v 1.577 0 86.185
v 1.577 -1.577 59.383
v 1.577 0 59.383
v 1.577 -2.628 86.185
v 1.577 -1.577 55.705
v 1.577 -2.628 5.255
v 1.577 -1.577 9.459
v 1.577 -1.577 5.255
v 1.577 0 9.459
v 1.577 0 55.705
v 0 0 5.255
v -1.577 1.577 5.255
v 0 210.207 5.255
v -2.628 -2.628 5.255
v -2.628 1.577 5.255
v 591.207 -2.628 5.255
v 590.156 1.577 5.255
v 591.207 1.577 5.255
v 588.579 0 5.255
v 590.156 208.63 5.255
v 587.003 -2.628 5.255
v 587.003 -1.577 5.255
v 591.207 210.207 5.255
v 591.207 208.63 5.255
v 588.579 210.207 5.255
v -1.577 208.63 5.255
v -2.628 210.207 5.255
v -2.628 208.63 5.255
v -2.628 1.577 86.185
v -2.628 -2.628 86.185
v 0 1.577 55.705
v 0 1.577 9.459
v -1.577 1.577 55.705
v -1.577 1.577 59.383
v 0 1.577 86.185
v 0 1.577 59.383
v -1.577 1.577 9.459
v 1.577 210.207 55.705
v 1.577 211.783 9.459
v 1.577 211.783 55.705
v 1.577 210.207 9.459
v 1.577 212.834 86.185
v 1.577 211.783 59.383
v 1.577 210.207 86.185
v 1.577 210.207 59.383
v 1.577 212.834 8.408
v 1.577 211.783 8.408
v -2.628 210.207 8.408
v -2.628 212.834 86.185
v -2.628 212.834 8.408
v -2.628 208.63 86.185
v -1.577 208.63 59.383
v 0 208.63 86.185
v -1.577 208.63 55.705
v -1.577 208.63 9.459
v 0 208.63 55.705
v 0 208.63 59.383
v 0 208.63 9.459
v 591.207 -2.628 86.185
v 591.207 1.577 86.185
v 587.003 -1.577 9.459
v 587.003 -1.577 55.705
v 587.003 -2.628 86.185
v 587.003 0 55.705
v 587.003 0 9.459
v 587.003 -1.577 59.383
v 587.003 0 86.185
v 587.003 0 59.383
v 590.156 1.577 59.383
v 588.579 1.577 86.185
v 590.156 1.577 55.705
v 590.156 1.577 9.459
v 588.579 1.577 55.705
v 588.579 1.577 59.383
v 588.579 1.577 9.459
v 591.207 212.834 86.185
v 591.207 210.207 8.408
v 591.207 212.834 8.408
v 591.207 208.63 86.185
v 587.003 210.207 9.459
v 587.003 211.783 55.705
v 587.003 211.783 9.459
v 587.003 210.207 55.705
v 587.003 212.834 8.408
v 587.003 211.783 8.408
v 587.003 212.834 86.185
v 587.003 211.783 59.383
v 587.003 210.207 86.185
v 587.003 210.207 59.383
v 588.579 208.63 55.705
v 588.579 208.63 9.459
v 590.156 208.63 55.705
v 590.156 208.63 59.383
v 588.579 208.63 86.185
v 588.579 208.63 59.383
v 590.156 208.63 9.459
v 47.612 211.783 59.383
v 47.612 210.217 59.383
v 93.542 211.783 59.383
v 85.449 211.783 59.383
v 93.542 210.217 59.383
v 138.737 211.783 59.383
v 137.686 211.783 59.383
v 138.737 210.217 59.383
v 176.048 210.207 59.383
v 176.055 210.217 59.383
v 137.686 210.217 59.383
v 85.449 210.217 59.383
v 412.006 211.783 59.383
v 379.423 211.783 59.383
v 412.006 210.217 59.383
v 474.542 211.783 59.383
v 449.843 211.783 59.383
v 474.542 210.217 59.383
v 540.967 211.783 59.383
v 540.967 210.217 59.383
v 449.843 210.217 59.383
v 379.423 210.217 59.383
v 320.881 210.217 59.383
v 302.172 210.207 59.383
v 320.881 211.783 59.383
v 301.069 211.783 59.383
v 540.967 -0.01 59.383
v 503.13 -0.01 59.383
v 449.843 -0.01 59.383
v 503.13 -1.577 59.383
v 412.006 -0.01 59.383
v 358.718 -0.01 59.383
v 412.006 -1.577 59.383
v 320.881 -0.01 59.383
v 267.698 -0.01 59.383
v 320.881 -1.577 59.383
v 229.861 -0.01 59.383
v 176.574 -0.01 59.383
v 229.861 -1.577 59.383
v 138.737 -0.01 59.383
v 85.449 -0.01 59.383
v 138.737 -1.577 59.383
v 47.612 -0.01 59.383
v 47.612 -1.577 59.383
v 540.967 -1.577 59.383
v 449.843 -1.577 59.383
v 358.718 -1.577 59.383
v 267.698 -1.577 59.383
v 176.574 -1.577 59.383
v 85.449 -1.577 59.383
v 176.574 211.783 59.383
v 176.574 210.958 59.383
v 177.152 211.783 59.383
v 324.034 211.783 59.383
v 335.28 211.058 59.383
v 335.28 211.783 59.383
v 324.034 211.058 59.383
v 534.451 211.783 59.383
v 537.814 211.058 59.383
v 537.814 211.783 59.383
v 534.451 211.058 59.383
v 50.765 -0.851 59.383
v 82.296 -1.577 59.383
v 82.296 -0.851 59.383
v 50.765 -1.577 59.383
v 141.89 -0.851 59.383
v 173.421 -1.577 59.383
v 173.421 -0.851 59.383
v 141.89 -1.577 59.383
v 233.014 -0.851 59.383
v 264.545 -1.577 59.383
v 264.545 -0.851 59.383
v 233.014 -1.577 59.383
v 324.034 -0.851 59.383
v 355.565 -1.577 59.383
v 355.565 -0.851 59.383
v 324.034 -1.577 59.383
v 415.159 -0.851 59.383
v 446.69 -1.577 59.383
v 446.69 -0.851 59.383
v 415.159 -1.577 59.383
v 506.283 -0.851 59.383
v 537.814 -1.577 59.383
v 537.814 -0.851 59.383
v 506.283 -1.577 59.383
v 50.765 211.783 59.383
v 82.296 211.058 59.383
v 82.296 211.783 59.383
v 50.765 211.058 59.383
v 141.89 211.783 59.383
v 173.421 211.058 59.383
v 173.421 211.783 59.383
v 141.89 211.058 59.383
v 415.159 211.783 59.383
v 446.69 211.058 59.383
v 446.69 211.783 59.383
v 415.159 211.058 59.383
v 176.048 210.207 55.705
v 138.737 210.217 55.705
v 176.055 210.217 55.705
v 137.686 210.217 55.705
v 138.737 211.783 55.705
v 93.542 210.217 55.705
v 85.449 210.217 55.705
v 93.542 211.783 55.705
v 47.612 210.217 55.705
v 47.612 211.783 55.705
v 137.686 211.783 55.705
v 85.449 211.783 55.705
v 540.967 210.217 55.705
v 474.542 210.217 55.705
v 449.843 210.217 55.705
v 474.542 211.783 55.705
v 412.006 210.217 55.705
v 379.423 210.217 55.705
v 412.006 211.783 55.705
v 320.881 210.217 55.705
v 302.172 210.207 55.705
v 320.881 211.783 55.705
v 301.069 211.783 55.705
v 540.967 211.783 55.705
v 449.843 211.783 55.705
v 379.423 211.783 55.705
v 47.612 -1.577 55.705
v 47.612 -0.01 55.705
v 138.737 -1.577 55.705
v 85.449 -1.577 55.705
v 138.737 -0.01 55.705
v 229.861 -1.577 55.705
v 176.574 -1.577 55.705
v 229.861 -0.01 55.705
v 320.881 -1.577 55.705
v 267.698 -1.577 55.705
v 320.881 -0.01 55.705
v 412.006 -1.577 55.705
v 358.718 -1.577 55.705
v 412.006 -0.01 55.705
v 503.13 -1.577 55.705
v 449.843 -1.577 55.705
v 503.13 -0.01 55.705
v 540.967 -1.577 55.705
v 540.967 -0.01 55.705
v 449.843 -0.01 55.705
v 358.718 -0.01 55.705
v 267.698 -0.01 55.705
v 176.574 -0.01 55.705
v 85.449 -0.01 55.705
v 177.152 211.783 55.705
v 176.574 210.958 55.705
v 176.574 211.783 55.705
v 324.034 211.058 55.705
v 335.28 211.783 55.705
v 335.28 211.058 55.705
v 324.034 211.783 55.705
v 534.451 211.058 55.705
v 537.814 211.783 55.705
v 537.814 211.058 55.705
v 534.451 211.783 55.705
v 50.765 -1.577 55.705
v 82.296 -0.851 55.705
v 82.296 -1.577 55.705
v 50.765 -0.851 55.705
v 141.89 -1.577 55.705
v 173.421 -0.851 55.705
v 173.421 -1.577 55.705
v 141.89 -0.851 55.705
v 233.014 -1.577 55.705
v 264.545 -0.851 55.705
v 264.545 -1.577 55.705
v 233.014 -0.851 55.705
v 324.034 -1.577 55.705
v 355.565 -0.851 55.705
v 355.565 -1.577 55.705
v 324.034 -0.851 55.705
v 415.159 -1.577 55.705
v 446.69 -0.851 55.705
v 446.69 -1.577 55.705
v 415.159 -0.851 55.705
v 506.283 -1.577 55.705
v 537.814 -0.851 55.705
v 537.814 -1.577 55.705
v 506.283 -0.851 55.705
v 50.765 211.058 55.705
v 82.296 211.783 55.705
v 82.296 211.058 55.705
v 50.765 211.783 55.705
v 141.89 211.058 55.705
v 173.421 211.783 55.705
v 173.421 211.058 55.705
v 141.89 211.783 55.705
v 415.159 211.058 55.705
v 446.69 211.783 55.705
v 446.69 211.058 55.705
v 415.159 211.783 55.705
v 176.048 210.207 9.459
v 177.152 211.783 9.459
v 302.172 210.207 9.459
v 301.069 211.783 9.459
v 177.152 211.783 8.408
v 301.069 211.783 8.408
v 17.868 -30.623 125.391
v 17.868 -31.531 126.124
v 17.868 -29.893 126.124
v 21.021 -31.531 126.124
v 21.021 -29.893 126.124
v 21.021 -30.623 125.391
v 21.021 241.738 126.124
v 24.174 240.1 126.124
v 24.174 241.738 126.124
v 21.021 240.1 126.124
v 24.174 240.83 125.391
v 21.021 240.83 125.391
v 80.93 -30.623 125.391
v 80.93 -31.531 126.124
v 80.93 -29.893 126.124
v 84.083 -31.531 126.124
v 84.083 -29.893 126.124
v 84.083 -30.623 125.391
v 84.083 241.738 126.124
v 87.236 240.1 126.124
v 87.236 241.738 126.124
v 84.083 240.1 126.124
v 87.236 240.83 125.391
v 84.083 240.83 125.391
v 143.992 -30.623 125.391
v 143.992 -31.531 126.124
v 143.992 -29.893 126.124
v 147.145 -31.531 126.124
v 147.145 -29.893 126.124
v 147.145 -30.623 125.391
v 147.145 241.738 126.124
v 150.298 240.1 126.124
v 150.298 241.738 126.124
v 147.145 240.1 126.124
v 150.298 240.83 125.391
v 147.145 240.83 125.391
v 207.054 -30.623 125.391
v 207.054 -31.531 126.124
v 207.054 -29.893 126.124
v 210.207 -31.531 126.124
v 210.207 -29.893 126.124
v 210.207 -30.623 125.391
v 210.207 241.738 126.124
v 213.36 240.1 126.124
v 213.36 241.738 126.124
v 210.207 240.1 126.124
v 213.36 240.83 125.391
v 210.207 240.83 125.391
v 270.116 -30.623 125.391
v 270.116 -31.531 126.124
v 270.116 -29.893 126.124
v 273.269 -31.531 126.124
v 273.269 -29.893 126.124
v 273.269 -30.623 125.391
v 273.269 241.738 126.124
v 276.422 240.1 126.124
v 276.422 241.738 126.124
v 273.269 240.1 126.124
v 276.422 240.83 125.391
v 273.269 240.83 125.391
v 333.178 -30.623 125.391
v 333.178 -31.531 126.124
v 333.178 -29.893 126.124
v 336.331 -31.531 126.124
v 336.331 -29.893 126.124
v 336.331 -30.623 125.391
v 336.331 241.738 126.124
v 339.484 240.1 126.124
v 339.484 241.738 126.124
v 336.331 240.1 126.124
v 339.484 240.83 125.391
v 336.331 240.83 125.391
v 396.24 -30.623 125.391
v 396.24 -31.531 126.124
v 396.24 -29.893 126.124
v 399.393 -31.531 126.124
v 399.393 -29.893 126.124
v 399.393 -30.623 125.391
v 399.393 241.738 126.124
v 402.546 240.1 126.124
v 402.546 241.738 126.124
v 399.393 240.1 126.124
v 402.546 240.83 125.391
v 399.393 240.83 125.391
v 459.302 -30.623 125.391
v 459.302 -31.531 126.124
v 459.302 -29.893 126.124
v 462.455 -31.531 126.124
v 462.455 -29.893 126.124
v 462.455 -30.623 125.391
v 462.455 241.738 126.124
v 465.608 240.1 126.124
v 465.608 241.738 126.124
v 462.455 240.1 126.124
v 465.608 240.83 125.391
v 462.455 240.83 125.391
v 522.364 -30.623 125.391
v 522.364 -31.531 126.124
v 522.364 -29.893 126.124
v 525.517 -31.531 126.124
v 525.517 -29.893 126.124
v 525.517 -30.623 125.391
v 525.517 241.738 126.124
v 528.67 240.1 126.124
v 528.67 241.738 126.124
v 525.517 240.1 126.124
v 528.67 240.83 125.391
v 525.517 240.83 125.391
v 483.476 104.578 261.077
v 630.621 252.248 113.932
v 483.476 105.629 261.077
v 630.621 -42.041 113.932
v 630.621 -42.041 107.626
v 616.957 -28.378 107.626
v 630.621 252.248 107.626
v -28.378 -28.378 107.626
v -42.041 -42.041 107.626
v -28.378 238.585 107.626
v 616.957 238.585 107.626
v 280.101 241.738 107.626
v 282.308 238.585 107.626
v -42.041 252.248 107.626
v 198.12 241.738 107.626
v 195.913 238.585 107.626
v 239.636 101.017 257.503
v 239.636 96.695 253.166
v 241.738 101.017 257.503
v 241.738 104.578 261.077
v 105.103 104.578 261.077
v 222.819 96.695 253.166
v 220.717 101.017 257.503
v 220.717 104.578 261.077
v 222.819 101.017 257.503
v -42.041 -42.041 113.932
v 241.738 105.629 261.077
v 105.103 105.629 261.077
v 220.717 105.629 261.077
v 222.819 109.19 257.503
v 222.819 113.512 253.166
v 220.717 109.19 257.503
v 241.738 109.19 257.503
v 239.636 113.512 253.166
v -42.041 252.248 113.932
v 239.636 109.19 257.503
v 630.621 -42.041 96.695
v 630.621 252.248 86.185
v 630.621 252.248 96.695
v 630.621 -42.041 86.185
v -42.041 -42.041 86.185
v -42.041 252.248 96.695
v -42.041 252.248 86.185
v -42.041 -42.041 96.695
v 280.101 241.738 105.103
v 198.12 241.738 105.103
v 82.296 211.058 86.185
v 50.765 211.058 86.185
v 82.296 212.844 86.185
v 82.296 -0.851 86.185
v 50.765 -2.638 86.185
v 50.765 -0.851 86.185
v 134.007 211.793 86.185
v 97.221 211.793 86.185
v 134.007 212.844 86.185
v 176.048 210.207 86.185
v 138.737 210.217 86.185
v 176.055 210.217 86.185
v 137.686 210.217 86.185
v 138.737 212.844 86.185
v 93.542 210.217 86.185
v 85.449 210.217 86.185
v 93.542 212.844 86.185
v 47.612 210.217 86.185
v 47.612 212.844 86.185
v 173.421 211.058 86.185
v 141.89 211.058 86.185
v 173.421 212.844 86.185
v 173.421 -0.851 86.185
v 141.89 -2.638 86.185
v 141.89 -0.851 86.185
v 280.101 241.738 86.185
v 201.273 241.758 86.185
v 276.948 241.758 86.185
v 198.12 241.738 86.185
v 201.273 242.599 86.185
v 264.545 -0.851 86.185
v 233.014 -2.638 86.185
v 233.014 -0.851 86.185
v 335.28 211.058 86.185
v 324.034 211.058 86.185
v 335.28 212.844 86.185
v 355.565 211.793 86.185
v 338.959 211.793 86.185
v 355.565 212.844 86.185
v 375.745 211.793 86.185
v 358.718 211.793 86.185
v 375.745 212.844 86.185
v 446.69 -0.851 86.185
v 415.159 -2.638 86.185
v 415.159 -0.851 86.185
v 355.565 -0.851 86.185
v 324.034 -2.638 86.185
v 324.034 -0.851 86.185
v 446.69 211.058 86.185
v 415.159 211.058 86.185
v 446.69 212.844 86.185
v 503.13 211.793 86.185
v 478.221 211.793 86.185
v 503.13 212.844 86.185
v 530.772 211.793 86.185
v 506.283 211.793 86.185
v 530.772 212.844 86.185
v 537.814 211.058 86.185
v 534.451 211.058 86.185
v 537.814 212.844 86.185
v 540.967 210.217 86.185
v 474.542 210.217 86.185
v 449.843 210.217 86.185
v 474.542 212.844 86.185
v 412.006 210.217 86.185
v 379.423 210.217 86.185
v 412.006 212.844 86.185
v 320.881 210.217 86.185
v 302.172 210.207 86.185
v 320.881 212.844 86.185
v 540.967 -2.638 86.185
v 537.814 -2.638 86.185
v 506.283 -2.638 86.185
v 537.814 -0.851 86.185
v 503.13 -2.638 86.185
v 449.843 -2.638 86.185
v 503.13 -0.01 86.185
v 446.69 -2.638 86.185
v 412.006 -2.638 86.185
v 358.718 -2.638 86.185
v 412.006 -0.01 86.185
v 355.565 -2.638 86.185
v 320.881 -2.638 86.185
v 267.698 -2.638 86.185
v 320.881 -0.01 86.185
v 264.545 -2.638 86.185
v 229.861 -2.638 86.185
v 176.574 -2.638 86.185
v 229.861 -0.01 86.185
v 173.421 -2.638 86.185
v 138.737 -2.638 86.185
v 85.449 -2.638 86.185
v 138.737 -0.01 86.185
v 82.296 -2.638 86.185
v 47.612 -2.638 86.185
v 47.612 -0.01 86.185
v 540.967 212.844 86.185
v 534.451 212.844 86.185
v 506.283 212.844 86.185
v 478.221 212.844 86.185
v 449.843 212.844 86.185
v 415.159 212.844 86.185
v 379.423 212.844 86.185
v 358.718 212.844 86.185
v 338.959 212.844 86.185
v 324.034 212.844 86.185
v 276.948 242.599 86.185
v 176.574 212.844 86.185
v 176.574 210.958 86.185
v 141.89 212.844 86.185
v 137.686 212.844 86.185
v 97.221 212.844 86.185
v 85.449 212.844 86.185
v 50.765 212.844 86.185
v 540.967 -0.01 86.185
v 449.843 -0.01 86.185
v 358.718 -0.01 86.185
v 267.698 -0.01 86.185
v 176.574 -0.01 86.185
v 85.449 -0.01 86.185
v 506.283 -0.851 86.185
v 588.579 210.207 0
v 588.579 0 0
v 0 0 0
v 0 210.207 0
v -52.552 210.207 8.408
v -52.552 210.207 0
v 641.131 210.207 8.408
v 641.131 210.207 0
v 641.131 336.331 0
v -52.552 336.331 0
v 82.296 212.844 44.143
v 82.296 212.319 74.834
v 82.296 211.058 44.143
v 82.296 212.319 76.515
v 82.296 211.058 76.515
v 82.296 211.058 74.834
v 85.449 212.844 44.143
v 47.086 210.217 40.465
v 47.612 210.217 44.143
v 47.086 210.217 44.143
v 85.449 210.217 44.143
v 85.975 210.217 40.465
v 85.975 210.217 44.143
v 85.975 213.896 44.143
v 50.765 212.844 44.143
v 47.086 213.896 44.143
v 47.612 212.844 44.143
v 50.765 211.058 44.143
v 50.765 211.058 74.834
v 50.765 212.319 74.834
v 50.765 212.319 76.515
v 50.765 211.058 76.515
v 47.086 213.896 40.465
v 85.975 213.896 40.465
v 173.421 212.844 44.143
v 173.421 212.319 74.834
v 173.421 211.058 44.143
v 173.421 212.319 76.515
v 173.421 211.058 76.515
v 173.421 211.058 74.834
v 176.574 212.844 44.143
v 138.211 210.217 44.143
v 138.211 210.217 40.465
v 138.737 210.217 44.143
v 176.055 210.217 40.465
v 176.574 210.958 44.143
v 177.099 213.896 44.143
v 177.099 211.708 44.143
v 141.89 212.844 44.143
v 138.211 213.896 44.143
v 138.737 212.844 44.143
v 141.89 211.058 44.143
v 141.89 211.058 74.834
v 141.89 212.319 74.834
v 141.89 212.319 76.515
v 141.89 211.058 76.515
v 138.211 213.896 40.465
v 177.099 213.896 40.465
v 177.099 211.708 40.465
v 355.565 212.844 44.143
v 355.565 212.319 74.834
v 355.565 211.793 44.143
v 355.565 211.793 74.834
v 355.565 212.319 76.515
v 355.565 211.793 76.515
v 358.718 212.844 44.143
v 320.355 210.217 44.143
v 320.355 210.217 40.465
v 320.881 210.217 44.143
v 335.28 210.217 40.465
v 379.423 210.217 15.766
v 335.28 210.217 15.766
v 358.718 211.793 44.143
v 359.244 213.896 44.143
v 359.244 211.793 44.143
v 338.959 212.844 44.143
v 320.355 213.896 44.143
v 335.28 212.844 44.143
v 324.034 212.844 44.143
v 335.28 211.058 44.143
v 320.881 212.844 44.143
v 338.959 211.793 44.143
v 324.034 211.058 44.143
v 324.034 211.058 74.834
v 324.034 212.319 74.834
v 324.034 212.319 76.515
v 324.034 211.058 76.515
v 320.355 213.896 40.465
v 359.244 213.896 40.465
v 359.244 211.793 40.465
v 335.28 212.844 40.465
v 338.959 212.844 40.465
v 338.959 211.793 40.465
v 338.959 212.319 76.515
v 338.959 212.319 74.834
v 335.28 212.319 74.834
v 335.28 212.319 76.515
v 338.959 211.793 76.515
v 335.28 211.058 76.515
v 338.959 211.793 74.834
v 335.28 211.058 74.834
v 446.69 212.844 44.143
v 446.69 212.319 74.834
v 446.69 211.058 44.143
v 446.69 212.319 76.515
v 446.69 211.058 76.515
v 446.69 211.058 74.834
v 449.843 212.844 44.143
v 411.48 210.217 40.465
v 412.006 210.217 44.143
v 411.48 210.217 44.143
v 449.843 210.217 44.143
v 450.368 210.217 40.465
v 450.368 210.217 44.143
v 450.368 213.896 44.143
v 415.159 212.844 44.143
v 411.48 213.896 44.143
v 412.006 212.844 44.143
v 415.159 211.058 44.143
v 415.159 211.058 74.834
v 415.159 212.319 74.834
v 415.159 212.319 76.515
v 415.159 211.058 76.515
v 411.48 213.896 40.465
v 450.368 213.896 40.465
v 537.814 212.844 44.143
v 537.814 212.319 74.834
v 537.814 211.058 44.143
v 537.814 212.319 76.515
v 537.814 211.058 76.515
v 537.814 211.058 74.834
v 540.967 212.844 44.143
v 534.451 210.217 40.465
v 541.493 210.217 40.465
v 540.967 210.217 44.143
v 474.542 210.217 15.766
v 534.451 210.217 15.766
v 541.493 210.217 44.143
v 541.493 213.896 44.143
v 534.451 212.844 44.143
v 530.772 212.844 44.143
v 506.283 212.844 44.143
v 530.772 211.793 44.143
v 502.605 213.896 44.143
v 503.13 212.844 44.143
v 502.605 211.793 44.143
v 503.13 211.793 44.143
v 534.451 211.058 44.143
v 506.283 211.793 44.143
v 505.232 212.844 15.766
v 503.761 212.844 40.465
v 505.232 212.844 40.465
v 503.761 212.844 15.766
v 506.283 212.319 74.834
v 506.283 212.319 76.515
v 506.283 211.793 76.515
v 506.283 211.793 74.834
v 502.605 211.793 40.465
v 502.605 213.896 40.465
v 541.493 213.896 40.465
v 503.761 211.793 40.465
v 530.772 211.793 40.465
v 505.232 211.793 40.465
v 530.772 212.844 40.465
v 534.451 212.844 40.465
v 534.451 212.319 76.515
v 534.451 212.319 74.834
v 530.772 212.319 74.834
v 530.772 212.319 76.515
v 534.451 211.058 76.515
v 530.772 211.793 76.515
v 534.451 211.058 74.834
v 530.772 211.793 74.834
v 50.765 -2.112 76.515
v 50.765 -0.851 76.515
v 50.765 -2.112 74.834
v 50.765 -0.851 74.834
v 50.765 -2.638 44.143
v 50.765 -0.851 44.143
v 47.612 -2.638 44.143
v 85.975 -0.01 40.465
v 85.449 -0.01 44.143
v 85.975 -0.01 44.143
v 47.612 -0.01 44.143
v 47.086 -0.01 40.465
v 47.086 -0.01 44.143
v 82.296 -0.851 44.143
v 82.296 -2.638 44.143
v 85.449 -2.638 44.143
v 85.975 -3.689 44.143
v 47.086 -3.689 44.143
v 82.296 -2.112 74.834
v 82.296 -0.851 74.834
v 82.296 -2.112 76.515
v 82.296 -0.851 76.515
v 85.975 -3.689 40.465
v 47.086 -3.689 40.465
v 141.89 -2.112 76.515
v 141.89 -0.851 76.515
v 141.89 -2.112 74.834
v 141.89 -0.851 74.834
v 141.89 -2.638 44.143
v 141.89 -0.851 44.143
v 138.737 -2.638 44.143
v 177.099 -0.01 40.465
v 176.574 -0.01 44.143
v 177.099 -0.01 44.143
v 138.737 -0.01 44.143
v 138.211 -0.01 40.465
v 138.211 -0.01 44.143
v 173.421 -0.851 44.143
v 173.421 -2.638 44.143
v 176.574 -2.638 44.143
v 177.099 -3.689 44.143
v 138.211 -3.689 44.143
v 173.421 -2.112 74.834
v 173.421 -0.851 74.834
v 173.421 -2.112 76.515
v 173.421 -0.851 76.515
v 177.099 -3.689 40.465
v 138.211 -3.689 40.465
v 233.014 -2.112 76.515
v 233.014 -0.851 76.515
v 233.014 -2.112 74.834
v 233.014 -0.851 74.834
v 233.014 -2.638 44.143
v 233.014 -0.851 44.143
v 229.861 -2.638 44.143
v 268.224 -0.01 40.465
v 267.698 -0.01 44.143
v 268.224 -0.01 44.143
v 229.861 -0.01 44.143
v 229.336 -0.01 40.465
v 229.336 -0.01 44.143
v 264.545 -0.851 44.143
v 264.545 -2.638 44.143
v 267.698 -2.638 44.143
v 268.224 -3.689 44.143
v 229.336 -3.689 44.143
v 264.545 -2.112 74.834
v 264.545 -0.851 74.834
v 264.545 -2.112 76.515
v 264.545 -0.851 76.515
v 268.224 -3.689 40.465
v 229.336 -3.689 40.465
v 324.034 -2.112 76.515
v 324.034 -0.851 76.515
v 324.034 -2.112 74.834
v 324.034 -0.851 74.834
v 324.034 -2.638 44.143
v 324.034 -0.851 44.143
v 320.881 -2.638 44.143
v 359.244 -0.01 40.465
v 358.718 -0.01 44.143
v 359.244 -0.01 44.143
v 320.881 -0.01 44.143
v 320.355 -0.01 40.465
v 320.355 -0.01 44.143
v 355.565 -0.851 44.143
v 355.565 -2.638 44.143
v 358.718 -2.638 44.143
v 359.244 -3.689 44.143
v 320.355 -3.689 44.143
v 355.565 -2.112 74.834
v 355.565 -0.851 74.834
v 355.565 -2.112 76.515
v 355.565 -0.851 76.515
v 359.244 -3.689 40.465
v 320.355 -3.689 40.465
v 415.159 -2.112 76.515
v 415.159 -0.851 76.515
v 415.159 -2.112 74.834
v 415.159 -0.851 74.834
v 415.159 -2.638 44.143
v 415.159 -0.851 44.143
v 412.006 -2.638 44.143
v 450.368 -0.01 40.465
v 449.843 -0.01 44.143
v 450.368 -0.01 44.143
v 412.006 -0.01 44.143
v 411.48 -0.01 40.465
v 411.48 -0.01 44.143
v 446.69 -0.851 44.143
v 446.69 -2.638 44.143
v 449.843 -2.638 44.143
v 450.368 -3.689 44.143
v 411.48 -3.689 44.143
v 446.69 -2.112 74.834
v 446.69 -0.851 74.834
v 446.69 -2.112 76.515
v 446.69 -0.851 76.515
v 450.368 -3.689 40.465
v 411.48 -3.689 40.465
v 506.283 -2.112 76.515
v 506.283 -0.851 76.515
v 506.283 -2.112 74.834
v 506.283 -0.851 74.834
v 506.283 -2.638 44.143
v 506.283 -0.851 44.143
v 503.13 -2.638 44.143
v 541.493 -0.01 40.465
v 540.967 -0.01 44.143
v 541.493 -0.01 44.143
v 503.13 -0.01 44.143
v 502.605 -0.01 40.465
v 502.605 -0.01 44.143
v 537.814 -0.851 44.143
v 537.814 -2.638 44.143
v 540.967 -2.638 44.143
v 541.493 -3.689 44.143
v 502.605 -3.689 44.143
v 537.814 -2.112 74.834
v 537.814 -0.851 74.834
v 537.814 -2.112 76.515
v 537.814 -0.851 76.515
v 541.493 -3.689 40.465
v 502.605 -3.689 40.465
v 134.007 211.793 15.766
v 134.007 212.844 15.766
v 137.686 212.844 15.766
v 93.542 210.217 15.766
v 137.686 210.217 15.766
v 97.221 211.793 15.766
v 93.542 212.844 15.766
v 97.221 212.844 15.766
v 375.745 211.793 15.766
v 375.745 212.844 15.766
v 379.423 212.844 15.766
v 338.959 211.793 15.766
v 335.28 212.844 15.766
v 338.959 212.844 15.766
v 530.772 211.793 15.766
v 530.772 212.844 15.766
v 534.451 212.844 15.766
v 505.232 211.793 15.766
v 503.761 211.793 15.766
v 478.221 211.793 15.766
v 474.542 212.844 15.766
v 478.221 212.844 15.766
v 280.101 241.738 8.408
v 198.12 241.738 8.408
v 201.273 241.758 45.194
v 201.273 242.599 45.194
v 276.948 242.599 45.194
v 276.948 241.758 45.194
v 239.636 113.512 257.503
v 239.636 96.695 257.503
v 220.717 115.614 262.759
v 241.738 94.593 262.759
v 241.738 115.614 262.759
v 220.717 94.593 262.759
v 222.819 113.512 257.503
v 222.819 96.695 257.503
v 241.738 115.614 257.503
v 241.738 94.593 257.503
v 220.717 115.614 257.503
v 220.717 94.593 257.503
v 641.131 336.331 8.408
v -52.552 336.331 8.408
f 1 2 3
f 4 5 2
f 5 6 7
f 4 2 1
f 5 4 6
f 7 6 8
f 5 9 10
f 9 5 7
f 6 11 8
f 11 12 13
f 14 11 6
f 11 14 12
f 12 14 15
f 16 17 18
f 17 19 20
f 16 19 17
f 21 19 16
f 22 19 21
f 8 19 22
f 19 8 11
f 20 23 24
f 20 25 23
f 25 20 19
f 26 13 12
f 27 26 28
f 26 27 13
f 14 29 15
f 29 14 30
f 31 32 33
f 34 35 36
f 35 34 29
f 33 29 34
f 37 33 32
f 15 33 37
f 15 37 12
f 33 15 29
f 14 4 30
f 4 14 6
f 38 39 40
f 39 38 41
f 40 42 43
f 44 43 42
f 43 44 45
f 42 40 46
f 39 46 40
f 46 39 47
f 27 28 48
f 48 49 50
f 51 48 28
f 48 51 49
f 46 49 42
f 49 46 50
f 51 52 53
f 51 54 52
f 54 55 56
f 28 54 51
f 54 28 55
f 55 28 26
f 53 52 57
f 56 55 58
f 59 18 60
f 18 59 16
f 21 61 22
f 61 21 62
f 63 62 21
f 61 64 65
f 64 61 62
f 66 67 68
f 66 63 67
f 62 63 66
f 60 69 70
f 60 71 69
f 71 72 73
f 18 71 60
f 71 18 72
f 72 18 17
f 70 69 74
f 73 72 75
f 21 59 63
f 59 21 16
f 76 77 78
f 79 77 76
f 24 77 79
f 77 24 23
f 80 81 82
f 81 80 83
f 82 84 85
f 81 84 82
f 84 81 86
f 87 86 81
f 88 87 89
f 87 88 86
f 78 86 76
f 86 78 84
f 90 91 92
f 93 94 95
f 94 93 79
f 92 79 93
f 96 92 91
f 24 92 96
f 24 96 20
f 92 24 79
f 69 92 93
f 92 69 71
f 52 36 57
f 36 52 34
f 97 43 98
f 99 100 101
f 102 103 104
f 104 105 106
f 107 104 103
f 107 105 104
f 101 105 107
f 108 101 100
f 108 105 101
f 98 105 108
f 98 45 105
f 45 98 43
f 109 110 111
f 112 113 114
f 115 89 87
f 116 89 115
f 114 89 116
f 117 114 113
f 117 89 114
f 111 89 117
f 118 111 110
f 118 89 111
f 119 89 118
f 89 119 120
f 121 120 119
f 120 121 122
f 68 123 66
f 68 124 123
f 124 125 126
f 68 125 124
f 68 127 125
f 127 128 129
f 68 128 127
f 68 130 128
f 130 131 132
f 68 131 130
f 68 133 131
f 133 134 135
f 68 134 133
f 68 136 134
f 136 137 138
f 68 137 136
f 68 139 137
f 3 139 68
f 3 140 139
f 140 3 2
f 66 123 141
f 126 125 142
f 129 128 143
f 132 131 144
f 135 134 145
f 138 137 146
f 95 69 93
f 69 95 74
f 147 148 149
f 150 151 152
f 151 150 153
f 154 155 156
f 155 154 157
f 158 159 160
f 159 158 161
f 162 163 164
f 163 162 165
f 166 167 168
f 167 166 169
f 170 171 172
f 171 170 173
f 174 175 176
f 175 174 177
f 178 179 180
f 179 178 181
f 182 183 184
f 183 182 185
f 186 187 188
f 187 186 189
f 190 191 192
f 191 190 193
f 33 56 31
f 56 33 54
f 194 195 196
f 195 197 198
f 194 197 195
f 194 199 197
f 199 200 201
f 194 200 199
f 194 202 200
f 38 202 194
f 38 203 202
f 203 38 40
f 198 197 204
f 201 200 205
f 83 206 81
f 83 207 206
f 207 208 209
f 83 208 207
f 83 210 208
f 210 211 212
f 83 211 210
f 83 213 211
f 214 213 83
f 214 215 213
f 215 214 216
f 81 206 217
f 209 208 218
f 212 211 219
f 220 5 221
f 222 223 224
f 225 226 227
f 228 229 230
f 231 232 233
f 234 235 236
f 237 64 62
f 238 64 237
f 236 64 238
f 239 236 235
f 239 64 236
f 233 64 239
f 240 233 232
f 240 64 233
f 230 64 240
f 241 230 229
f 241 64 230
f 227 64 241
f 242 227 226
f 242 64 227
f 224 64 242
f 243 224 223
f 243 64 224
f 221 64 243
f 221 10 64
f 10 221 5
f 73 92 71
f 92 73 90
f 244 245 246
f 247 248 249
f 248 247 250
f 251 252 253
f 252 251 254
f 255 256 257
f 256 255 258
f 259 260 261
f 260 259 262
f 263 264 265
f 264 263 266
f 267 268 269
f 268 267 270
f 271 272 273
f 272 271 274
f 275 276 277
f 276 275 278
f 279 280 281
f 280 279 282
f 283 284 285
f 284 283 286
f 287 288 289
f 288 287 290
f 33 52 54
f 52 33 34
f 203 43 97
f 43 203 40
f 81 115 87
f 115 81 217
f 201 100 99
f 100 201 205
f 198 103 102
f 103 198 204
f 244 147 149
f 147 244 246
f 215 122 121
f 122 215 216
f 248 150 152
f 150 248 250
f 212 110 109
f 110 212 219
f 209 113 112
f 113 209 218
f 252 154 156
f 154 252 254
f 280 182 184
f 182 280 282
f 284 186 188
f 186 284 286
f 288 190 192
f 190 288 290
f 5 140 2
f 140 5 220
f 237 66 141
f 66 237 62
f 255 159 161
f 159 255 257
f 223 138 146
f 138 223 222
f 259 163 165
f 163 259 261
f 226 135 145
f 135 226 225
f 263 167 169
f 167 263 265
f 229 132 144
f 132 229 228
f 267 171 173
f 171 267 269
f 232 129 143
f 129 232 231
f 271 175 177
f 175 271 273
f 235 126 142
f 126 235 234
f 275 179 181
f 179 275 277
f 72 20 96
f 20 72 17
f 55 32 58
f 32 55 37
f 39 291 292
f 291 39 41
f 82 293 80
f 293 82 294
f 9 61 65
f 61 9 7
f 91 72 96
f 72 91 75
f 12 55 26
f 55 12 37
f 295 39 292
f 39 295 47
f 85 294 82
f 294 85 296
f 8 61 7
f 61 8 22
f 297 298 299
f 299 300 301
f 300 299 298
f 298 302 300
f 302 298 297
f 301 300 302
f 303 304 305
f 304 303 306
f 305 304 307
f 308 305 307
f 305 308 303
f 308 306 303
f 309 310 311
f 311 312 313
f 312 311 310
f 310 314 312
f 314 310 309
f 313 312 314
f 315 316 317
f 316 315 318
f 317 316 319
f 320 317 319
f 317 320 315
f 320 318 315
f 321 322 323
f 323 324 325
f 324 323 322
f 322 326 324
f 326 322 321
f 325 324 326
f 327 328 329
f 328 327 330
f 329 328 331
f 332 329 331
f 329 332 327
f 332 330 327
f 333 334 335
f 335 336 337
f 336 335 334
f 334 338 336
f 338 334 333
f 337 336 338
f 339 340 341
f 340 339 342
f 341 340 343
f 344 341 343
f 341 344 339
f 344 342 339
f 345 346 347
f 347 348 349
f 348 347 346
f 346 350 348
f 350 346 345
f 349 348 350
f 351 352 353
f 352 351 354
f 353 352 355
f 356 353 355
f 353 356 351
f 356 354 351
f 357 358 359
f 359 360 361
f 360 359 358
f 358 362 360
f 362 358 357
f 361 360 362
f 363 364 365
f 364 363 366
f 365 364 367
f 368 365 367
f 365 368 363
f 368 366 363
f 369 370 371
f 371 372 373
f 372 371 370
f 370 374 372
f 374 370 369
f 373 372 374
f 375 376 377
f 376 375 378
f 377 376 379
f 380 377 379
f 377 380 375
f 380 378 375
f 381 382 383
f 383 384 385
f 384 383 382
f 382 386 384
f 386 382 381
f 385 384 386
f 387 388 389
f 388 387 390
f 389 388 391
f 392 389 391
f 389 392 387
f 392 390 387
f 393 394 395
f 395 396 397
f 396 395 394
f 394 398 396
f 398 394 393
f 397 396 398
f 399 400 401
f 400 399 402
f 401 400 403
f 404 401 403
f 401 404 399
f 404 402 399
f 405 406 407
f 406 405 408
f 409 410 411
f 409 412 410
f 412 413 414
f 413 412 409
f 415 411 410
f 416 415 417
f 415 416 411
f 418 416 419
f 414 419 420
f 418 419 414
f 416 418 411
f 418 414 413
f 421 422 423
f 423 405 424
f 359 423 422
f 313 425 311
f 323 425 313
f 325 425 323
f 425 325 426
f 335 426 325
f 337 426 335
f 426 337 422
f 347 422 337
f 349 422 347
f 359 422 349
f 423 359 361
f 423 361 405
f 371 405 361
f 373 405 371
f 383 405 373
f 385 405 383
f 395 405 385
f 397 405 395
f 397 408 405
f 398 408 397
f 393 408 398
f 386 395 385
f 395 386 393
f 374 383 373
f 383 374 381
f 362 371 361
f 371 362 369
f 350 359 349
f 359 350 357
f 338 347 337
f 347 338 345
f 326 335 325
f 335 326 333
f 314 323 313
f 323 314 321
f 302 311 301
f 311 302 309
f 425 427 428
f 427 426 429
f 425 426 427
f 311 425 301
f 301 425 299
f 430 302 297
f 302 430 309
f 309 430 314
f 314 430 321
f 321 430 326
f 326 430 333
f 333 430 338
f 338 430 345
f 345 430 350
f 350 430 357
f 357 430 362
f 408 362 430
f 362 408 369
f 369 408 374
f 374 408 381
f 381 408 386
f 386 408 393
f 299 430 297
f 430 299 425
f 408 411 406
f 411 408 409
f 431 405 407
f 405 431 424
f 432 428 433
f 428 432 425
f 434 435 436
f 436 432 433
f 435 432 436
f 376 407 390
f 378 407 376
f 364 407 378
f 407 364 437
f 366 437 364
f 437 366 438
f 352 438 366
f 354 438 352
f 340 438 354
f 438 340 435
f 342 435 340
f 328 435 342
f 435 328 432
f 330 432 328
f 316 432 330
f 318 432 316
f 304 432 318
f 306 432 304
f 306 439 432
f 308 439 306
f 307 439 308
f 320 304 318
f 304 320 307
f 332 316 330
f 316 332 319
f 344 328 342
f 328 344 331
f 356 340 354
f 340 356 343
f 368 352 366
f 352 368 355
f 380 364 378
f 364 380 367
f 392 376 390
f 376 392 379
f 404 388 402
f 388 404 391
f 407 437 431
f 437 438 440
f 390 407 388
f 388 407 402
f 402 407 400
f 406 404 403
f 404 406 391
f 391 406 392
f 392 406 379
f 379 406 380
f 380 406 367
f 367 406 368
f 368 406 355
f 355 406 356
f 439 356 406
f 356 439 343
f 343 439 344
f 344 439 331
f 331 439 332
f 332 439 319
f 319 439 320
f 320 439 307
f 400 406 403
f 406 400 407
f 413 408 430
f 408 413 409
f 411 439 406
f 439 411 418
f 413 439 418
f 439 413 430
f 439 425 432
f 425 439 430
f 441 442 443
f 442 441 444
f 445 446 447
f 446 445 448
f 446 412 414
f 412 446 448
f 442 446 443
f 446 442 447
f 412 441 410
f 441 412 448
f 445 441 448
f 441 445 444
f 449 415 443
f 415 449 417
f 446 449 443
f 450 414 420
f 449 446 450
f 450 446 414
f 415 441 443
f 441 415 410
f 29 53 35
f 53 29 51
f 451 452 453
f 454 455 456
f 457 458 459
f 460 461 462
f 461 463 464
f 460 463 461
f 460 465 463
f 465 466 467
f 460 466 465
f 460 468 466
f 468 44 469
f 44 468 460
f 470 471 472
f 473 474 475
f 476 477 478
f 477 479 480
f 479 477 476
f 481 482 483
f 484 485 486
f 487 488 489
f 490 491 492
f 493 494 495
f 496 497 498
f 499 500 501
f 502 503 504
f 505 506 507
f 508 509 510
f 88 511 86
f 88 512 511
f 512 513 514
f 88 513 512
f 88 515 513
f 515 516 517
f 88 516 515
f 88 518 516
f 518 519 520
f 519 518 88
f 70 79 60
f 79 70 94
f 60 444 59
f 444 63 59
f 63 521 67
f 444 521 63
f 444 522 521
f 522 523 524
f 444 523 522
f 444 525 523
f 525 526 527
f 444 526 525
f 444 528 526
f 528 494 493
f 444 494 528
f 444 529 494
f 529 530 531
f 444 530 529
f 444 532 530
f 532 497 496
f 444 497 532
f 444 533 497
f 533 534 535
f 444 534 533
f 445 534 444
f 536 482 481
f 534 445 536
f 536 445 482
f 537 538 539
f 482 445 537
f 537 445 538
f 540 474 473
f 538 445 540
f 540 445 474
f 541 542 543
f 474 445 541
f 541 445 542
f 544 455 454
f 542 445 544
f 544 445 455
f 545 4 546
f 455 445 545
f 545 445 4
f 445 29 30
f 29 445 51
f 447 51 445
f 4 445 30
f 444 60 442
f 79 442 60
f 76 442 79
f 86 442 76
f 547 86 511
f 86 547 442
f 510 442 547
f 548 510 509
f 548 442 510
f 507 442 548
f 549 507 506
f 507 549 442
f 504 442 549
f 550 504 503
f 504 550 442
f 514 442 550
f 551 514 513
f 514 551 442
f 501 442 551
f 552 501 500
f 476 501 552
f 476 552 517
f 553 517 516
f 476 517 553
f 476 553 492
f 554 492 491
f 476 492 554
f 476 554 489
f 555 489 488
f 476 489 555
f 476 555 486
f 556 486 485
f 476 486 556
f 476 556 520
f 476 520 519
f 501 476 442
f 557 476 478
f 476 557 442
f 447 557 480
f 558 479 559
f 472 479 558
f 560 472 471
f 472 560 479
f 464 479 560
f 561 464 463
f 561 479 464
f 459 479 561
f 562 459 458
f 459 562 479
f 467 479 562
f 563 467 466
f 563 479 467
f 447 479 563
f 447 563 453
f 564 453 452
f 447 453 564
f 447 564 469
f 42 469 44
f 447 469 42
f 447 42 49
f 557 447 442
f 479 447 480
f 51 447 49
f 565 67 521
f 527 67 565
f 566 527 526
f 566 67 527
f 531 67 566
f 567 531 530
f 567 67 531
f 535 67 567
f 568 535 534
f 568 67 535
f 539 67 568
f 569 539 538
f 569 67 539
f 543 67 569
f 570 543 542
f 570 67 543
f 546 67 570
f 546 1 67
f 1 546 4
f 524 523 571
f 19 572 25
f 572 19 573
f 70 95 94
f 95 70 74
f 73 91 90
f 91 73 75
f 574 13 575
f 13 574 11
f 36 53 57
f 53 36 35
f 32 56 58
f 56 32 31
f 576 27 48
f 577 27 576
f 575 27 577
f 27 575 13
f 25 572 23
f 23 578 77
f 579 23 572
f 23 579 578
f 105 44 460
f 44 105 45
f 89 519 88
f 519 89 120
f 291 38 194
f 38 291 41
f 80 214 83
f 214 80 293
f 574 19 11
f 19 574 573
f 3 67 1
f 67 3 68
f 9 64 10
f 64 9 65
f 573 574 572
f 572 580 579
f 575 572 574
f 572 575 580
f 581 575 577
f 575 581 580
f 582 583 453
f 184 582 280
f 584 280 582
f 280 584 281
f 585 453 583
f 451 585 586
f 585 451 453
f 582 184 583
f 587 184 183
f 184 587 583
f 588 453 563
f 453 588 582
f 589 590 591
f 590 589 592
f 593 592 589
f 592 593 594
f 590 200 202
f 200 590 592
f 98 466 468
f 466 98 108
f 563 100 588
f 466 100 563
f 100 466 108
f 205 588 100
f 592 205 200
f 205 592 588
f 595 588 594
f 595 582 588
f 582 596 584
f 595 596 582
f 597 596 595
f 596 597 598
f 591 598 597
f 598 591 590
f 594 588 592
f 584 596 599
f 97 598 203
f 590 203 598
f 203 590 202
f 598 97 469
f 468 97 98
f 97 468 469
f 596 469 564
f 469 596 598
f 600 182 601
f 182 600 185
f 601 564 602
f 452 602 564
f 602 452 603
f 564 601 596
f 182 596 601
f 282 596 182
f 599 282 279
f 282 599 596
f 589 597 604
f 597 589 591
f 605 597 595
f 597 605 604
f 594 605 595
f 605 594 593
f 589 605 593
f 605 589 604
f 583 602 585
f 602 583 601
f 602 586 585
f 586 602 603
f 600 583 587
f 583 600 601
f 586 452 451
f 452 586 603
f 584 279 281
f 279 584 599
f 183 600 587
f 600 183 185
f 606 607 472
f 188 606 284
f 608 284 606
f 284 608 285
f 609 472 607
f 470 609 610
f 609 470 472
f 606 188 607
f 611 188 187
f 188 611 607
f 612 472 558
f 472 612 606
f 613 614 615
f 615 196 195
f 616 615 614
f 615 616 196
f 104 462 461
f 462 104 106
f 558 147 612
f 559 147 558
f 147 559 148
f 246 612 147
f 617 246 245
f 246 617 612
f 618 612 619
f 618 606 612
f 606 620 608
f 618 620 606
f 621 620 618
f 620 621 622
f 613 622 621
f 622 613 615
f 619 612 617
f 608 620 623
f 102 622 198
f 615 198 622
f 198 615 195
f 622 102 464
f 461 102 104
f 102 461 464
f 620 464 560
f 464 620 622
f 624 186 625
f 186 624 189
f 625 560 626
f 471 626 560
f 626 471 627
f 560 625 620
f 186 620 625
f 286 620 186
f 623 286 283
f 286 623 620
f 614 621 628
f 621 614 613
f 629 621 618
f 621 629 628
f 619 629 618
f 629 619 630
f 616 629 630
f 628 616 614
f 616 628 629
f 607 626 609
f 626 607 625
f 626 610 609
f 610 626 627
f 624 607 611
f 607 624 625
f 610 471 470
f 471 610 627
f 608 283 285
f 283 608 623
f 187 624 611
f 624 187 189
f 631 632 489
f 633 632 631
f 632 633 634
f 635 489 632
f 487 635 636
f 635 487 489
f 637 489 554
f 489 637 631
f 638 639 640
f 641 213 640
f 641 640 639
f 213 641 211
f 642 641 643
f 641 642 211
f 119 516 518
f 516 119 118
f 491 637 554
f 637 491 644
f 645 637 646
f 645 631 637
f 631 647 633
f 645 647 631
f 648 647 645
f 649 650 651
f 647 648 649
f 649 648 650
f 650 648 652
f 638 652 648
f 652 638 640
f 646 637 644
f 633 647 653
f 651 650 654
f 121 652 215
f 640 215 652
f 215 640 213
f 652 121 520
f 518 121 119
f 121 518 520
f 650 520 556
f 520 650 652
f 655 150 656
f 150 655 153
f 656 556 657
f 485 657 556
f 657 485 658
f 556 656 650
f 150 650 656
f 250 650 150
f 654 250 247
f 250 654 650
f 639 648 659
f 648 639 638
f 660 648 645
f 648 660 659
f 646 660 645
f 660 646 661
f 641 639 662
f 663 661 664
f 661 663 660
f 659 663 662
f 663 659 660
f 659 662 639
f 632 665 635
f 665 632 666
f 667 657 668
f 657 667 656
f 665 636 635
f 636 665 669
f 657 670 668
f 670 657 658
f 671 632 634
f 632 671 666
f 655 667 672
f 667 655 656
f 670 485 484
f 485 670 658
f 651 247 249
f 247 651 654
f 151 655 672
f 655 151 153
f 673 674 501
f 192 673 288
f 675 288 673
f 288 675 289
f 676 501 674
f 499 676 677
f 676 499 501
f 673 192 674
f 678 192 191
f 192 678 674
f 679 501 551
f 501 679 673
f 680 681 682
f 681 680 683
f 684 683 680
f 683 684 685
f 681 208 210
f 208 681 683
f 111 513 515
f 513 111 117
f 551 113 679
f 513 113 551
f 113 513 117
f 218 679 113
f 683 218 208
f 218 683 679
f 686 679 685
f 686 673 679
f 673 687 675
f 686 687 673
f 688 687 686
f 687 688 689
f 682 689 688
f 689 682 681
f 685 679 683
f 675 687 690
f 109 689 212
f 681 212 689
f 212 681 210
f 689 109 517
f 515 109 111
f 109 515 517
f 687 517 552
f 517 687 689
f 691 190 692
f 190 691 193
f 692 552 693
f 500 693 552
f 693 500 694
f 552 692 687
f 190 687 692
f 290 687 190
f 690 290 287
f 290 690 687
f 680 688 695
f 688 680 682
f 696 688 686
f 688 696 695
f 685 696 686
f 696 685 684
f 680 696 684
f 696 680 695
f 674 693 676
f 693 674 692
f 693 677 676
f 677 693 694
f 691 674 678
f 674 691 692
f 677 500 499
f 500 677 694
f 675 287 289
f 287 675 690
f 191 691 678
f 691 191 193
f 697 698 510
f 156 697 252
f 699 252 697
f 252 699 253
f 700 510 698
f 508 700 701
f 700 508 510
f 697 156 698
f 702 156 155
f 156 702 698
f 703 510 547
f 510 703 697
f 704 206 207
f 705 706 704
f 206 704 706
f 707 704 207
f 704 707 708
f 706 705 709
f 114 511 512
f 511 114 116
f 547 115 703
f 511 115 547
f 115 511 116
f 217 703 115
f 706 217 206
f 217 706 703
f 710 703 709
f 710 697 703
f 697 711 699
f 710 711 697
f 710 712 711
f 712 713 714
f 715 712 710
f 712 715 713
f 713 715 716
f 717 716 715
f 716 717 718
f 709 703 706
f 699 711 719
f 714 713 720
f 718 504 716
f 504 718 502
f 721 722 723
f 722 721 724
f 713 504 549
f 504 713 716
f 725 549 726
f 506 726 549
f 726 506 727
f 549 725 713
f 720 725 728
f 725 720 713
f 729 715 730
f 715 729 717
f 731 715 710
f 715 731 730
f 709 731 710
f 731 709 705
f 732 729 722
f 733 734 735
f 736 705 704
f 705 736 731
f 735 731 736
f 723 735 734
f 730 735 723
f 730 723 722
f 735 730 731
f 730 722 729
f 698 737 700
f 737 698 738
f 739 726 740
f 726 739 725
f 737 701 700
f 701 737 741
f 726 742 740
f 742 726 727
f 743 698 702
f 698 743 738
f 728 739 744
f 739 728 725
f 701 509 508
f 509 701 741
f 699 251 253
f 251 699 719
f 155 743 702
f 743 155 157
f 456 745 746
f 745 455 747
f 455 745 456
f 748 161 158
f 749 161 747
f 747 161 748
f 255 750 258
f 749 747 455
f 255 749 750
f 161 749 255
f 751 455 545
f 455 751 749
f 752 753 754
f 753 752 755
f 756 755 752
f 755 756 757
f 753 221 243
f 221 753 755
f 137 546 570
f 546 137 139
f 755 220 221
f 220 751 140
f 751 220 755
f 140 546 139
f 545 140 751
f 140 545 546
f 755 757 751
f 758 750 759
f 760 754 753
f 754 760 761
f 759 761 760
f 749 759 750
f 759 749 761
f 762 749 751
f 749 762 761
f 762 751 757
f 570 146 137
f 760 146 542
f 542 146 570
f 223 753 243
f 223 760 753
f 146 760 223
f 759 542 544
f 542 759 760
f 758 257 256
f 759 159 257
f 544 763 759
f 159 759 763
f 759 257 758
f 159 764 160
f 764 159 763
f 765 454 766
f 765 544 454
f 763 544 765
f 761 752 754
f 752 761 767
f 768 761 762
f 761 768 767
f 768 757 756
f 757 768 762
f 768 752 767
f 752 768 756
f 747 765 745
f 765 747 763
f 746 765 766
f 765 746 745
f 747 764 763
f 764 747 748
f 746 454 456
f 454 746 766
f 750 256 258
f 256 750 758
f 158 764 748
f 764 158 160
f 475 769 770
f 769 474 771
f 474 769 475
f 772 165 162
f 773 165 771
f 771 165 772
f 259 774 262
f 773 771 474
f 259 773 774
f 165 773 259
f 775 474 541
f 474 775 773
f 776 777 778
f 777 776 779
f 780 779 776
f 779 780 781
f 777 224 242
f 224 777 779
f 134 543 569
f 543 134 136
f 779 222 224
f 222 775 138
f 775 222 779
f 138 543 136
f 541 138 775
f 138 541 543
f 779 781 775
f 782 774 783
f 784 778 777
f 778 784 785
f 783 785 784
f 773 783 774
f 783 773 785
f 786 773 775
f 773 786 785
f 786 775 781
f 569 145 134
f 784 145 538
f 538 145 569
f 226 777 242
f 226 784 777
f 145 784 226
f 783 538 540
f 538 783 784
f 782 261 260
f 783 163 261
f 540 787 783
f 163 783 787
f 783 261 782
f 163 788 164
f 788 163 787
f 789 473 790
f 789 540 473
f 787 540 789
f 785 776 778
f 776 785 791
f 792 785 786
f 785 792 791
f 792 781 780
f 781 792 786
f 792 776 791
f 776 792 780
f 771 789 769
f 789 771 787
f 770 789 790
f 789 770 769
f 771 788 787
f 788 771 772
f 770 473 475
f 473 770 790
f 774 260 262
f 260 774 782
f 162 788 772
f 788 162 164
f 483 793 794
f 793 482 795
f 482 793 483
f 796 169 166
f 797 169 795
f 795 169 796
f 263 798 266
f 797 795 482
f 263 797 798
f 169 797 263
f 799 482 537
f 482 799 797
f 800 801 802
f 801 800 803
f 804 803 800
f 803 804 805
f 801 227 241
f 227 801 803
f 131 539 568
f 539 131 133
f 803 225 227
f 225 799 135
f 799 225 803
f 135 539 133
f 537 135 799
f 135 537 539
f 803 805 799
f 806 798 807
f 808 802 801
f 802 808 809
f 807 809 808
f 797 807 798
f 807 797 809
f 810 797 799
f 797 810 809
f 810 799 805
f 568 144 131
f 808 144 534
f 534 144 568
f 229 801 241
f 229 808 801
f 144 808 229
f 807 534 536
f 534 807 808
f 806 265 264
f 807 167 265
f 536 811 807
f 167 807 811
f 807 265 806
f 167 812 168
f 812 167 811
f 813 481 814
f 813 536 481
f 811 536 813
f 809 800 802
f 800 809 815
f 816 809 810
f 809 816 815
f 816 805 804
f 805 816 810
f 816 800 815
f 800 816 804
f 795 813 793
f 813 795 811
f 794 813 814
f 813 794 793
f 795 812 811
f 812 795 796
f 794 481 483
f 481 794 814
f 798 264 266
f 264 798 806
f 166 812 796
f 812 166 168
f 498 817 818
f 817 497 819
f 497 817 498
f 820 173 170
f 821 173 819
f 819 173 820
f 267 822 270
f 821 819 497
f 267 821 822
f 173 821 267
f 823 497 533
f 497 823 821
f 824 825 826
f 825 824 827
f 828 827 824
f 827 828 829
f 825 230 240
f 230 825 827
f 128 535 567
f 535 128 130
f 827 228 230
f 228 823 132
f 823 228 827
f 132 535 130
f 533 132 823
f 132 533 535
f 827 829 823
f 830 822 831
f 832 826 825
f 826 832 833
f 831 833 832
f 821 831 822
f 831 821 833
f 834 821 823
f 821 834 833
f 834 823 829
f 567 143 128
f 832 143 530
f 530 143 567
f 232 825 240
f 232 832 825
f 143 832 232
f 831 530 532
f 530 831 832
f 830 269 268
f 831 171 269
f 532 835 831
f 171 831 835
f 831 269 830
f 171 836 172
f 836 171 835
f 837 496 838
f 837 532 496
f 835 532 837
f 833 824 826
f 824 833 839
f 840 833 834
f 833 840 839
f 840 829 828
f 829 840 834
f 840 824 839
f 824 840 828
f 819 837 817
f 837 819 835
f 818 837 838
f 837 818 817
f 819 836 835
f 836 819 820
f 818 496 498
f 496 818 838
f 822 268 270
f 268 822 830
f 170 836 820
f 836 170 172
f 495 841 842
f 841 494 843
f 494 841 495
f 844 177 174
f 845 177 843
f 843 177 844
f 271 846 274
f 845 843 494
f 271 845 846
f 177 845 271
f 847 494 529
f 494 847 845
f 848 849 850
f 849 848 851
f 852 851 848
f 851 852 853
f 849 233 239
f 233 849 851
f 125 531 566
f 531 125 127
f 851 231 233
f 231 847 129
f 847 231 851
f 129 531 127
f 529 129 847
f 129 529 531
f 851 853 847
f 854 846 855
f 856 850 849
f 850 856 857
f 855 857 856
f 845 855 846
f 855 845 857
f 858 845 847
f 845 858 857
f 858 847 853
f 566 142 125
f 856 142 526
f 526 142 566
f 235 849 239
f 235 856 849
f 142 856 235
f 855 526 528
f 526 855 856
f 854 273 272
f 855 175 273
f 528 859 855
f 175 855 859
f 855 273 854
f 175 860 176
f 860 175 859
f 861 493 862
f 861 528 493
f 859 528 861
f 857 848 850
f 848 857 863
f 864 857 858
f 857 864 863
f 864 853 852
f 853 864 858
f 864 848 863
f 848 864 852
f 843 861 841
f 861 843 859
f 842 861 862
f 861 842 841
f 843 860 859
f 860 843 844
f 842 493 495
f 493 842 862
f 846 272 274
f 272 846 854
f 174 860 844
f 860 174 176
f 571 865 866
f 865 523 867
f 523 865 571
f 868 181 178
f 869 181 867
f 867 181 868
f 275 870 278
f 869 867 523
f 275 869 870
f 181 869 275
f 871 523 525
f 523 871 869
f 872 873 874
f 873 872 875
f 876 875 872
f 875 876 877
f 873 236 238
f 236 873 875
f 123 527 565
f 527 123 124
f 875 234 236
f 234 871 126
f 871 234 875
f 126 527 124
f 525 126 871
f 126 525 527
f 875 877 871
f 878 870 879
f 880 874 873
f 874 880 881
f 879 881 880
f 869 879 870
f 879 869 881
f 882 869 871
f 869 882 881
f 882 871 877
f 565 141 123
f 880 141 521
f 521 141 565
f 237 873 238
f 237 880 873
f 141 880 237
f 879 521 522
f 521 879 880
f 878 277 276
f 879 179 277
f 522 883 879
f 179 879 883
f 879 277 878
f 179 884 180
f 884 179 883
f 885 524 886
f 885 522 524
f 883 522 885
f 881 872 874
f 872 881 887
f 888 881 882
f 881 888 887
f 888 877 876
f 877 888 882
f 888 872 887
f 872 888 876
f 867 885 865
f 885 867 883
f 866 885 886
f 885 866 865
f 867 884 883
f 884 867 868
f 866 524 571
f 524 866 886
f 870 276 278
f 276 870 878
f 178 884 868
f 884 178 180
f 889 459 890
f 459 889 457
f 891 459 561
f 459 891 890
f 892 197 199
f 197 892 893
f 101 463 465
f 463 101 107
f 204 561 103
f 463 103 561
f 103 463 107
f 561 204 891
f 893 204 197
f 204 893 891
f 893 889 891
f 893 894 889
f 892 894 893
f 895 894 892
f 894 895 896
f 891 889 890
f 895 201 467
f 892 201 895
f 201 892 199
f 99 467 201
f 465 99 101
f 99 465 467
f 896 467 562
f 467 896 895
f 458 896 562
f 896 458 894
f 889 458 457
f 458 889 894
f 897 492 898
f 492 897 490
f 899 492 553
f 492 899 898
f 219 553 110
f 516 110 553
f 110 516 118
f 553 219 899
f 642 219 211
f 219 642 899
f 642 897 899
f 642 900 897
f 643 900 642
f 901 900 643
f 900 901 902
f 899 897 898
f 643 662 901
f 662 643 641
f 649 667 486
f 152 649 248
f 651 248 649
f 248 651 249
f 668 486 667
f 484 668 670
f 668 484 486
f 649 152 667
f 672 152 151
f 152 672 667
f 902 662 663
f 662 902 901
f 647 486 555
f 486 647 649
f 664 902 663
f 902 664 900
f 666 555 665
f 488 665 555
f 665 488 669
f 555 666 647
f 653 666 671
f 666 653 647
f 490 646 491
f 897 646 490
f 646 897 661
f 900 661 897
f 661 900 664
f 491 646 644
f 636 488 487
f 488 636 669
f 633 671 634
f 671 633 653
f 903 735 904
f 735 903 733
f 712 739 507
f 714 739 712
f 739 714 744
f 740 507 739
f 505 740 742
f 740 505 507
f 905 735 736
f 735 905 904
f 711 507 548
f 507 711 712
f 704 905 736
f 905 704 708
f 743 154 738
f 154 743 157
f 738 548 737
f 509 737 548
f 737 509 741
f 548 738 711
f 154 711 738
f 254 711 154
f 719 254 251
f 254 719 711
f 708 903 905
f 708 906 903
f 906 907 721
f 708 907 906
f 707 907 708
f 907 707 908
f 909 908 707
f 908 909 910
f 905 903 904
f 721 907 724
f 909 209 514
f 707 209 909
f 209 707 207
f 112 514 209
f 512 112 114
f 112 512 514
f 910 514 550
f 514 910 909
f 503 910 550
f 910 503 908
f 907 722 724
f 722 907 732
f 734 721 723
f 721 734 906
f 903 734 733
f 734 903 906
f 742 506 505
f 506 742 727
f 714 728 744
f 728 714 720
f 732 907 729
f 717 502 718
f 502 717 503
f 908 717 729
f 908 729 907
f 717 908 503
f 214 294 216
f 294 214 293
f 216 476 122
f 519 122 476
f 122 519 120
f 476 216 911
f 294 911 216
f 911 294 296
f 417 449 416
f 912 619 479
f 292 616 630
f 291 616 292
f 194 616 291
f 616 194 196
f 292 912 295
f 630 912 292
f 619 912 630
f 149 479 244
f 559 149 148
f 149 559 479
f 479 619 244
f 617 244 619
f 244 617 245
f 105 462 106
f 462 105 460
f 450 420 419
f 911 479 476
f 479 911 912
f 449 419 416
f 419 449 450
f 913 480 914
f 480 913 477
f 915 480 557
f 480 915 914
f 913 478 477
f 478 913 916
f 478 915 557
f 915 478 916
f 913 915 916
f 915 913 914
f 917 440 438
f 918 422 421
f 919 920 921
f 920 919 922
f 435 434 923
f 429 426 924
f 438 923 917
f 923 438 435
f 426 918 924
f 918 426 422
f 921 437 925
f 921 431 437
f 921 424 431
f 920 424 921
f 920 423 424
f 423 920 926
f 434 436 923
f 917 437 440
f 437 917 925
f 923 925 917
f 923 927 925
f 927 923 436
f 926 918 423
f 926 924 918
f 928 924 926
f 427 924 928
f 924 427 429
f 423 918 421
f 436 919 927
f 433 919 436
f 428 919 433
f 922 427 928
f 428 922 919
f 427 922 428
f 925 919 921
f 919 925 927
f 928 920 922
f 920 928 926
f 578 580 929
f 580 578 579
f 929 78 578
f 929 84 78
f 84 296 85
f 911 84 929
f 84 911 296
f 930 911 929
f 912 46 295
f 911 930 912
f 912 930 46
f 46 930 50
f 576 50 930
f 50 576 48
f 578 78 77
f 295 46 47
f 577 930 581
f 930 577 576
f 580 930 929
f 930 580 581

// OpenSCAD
// =====================================================================
//  MILWAUKEE ROAD - STOWELL, WIS. PASSENGER DEPOT
//  Source: Album sheet 69, drawing B-586, Sept 14 1909.  Drawings are private reference (in copyright):
//  Research Library / RSW / Stations / Standard depots / Album of Depot Plans 1919.
//  Rib Side Works, 24 Nov 2026. FIRST SHAPE MODEL for review - not cut into print sections.
//  KNOWN (from the sheet): 56 x 20 ft; general waiting 16 x 19, office 11 ft 6 x 9 with bay, smoking 10 x 19, baggage and express 16 x 19; flared hipped shingle roof, diamond-pane upper sash, lap siding.
//  ESTIMATE: wall and ridge heights where not written, window count and spacing, colours.
//  Built with the shared depot builder ../../../_common/rsw_depot.scad (x along the track,
//  y = 0 town side, track side +y, feet).  SCALE: 29 = G, 48 = O, 87 = HO.
// =====================================================================
SCALE = 29;
include <../../../_common/rsw_depot.scad>

depot(blocks = [[0, 56, 0, 20, 12, 0.8, 3, 4, 0]],
      pavs   = [],
      wins   = [[6.33, 1, 3, 6, 4.2], [15.0, 1, 3, 6, 4.2], [23.67, 1, 3, 6, 4.2], [32.33, 1, 3, 6, 4.2], [41.0, 1, 3, 6, 4.2], [49.67, 1, 3, 6, 4.2], [6.33, 0, 3, 6, 4.2], [15.0, 0, 3, 6, 4.2], [23.67, 0, 3, 6, 4.2], [32.33, 0, 3, 6, 4.2], [41.0, 0, 3, 6, 4.2], [49.67, 0, 3, 6, 4.2]],
      doors  = [[11, 1, 3.5, 7.5, 0], [34, 1, 3.5, 7.5, 0], [48, 1, 5, 8, 1]],
      bays   = [[22.75, 1, 12, 3]],
      chims  = [[22, 10, 25]],
      plat   = [-5, 66, 12, 0.8]);
